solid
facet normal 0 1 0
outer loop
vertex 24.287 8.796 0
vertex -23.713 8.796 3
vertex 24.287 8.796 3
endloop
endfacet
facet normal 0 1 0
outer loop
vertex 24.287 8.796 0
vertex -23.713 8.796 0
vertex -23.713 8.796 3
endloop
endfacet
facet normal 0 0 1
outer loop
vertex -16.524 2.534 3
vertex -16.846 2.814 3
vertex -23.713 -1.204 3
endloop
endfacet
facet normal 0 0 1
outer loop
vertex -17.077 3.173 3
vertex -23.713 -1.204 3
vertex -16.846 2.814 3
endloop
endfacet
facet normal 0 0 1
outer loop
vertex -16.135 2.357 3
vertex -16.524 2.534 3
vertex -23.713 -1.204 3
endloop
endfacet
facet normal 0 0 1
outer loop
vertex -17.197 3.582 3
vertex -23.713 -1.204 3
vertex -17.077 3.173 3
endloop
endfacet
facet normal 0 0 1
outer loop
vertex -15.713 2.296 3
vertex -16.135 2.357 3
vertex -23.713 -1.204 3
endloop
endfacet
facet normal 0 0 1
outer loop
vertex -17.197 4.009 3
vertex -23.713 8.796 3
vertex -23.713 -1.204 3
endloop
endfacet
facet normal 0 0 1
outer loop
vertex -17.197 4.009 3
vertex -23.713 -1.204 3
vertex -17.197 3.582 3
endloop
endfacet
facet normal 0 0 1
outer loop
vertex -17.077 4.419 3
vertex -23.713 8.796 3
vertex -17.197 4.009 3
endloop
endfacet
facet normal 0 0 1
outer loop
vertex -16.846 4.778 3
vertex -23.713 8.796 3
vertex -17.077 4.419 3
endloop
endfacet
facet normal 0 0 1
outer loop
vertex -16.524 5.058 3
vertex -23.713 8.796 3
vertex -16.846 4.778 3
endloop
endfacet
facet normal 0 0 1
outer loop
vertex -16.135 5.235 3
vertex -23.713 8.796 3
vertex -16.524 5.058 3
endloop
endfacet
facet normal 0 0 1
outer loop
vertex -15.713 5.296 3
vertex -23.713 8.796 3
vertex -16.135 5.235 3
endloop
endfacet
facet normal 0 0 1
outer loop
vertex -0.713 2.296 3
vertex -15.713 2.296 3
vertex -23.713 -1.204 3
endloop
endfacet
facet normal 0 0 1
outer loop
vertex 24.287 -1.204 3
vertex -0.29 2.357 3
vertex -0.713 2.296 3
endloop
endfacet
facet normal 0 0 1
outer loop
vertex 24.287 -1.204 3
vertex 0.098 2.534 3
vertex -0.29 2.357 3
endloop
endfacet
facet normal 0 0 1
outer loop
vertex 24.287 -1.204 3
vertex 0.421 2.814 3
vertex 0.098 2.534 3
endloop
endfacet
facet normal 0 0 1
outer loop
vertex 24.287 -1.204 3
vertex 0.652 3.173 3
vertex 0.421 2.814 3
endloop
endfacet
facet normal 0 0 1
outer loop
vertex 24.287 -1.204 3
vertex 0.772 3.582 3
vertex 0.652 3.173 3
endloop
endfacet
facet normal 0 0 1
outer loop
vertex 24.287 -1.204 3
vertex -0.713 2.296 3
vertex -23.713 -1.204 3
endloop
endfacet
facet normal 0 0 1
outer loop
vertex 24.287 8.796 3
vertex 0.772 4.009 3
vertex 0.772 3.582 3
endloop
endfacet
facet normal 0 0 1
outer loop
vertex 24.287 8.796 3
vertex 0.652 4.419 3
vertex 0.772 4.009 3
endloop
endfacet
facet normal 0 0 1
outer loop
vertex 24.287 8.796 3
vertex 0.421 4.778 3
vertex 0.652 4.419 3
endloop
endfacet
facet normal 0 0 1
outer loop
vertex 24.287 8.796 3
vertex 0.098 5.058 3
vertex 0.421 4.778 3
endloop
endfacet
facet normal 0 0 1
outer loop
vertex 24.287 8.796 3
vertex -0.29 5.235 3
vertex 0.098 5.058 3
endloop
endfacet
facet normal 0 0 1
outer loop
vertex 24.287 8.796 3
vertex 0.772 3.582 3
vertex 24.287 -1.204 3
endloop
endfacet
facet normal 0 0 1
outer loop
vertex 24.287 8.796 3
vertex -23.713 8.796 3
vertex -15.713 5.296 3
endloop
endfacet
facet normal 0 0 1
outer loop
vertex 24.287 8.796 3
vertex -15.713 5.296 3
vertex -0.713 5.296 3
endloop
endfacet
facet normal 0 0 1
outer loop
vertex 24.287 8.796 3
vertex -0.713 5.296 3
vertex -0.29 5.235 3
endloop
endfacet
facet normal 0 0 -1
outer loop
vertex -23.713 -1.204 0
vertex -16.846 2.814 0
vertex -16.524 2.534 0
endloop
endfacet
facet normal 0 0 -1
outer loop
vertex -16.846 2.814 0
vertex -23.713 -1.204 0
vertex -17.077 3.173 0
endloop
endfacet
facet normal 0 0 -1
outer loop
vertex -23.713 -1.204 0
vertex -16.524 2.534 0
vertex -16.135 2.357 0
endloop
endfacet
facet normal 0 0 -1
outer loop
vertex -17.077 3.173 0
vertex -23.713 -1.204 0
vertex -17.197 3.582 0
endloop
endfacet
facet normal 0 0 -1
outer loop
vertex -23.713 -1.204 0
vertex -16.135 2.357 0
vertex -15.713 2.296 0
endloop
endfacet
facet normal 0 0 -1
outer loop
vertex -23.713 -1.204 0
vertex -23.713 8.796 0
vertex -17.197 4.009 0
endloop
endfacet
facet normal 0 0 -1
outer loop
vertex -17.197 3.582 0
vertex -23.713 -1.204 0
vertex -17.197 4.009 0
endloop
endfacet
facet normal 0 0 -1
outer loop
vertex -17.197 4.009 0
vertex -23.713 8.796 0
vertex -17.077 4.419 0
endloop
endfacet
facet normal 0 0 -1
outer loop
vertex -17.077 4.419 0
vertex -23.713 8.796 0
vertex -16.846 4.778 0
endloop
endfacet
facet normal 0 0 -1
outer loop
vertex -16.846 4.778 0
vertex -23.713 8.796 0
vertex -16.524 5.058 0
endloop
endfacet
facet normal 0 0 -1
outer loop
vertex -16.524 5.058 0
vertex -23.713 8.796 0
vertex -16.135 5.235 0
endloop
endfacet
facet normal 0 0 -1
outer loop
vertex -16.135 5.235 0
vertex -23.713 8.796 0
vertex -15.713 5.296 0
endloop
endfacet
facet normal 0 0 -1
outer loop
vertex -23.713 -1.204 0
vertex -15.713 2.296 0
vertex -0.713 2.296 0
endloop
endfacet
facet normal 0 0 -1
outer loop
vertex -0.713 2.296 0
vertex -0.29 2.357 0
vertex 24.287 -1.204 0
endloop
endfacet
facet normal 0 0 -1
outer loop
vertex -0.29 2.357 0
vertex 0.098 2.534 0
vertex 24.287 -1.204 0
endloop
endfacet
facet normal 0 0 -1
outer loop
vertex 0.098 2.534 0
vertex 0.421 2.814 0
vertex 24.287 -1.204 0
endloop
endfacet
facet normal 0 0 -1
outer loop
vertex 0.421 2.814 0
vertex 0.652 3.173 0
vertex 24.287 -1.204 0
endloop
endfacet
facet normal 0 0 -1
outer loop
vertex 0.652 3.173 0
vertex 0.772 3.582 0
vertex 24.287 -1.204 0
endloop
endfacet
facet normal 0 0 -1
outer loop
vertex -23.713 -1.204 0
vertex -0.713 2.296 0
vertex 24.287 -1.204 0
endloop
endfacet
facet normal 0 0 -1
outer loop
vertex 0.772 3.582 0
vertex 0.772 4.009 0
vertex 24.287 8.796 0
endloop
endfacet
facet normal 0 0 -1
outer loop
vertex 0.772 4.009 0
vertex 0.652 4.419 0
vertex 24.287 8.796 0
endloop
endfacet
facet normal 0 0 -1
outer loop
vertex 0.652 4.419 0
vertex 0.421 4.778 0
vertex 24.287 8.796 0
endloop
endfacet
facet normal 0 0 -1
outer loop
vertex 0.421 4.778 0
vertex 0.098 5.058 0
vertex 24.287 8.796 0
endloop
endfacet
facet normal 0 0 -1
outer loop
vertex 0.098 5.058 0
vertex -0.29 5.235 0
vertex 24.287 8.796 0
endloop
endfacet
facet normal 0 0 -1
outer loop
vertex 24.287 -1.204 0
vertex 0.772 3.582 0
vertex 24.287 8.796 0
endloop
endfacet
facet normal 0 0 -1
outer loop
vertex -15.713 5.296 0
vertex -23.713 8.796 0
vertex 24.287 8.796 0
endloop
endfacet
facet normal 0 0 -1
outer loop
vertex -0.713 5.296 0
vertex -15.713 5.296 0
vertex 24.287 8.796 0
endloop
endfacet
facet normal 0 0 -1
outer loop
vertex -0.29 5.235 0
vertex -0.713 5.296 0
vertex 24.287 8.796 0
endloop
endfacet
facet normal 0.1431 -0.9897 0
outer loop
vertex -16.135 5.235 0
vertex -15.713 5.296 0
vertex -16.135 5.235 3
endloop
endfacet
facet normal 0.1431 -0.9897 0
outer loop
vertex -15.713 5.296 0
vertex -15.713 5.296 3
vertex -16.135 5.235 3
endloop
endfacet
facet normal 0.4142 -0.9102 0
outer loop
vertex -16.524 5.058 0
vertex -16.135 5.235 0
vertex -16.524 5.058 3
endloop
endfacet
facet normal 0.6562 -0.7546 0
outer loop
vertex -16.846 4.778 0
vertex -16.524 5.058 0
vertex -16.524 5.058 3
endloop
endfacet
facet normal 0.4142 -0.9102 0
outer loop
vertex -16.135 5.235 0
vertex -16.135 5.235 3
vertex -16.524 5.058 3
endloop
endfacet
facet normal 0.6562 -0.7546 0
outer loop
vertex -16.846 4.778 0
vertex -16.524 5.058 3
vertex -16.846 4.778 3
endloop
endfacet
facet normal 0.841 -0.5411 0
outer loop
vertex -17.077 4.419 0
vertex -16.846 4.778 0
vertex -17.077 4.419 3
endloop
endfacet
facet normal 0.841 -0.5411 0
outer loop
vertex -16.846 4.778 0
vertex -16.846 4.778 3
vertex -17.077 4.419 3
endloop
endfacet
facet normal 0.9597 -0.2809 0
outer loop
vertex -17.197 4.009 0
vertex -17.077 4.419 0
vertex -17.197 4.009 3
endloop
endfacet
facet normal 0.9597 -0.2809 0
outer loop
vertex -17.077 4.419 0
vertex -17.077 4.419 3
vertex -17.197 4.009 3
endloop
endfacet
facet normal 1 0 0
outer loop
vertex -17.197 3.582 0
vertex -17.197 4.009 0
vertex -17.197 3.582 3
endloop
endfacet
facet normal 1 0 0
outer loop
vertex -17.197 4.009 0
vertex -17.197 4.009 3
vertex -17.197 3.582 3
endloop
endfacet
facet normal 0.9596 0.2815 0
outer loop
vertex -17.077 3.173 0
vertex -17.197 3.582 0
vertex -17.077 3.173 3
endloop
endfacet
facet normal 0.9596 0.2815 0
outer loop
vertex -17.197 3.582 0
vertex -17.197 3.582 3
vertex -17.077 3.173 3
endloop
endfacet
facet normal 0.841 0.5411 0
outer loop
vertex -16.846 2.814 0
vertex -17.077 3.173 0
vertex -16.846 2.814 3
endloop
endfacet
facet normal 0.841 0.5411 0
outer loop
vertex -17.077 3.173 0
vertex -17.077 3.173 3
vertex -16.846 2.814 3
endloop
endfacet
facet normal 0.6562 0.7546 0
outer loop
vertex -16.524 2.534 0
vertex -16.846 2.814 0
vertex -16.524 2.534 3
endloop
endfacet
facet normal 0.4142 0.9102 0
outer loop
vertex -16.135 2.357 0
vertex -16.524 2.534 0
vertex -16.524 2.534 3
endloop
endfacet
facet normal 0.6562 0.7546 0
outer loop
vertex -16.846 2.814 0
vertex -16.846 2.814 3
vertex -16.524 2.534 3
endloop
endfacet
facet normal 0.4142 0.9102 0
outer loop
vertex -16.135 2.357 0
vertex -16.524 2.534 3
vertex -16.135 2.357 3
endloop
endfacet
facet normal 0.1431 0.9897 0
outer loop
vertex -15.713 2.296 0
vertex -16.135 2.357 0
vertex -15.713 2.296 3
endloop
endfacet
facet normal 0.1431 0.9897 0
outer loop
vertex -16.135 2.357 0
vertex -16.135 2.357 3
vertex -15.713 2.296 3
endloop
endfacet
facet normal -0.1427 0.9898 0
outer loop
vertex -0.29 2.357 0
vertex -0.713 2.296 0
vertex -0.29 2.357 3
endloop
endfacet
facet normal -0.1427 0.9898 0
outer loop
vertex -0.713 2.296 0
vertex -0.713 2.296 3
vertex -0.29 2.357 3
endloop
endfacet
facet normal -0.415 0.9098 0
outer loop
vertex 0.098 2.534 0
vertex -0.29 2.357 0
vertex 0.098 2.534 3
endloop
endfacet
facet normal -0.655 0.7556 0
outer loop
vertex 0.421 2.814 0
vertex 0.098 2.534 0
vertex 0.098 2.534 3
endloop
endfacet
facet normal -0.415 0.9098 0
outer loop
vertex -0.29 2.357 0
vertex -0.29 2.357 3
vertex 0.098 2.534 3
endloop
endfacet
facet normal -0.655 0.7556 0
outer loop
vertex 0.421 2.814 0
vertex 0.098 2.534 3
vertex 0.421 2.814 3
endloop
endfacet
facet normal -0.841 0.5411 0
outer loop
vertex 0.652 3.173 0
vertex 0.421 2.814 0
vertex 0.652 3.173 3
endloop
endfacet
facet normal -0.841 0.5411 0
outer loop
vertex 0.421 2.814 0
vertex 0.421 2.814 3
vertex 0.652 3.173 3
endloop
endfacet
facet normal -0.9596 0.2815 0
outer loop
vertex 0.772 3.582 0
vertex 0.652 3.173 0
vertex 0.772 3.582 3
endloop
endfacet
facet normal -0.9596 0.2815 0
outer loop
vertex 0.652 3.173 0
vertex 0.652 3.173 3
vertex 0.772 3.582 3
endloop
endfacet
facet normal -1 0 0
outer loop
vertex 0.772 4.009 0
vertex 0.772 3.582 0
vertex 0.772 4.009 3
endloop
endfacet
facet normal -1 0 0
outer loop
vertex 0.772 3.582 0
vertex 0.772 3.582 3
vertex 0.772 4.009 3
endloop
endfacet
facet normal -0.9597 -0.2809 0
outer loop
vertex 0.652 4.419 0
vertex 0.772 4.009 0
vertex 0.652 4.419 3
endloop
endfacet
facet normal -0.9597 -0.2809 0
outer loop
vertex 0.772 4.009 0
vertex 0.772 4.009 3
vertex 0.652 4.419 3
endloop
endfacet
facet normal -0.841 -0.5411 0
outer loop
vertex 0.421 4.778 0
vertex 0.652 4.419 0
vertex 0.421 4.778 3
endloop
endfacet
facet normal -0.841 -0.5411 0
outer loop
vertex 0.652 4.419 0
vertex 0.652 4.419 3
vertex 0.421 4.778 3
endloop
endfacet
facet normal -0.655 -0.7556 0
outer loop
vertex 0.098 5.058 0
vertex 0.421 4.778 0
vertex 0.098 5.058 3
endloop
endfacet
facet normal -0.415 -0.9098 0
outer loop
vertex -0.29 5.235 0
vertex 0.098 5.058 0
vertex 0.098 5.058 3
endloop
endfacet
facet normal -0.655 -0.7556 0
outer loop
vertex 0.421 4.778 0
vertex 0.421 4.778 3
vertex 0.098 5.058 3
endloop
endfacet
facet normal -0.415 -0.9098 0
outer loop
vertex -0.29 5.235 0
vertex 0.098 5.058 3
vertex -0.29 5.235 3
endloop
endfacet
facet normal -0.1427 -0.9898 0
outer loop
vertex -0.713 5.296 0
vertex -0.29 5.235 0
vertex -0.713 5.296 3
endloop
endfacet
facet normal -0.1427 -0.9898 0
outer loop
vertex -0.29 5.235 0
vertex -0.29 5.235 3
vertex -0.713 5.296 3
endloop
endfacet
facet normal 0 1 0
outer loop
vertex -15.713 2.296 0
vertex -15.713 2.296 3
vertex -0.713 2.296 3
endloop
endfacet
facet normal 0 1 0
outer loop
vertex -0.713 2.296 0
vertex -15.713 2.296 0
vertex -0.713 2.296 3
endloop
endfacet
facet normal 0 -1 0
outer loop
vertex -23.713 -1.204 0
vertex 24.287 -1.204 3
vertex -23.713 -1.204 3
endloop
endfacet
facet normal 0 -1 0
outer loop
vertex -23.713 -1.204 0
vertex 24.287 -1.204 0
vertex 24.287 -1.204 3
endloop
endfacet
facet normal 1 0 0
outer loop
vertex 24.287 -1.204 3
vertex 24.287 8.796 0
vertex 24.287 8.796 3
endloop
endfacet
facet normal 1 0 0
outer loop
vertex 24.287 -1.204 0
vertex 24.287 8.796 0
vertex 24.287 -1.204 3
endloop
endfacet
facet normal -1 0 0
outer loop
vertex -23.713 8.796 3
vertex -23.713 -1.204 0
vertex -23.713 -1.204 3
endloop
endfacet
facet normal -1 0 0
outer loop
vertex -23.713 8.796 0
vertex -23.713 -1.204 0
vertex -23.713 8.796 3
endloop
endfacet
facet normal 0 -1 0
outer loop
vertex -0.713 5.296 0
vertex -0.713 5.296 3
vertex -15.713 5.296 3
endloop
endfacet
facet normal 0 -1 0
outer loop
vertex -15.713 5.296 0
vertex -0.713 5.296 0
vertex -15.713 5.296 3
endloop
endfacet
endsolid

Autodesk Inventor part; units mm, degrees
ref_plane "YZ Plane" through (0, 0, 0) normal (1, 0, 0) x (0, 1, 0)
ref_plane "XZ Plane" through (0, 0, 0) normal (0, 1, 0) x (-1, 0, 0)
ref_plane "XY Plane" through (0, 0, 0) normal (0, 0, 1) x (1, 0, 0)
sketch "スケッチ1" plane through (0, 0, 0) normal (0, 0, 1) x (1, 0, 0)
  line L0 (-23.7126, 8.7959) -> (24.2874, 8.7959)
  line L1 (24.2874, 8.7959) -> (24.2874, -1.2041)
  line L2 (24.2874, -1.2041) -> (-23.7126, -1.2041)
  line L3 (-23.7126, -1.2041) -> (-23.7126, 8.7959)
  point P0 (0, 0)
  dimension "d0" = 48
  dimension "d1" = 10
extrude "押し出し1" add sketch "スケッチ1" along normal blind 3
sketch "スケッチ2" plane through (0, 0, 3) normal (0, 0, 1) x (1, 0, 0)
  line L0 (-15.7126, 3.7959) -> (-0.7126, 3.7959) construction
  line L1 (-15.7126, 2.2959) -> (-0.7126, 2.2959)
  line L2 (-0.7126, 5.2959) -> (-15.7126, 5.2959)
  arc A0 (-15.7126, 5.2959) -> (-15.7126, 2.2959) centre (-15.7126, 3.7959) ccw
  arc A1 (-0.7126, 2.2959) -> (-0.7126, 5.2959) centre (-0.7126, 3.7959) ccw
  line L3 (-23.7126, 8.7959) -> (-23.7126, -1.2041) projected
  line L4 (24.2874, 8.7959) -> (-23.7126, 8.7959) projected
  point P0 (0, 0)
  point P1 (-8.2126, 3.7959)
  dimension "d4" = 15
  dimension "d5" = 3
  dimension "d6" = 8
  dimension "d7" = 5
extrude "押し出し2" cut sketch "スケッチ2" against normal blind 3
properties part number "creat7"
